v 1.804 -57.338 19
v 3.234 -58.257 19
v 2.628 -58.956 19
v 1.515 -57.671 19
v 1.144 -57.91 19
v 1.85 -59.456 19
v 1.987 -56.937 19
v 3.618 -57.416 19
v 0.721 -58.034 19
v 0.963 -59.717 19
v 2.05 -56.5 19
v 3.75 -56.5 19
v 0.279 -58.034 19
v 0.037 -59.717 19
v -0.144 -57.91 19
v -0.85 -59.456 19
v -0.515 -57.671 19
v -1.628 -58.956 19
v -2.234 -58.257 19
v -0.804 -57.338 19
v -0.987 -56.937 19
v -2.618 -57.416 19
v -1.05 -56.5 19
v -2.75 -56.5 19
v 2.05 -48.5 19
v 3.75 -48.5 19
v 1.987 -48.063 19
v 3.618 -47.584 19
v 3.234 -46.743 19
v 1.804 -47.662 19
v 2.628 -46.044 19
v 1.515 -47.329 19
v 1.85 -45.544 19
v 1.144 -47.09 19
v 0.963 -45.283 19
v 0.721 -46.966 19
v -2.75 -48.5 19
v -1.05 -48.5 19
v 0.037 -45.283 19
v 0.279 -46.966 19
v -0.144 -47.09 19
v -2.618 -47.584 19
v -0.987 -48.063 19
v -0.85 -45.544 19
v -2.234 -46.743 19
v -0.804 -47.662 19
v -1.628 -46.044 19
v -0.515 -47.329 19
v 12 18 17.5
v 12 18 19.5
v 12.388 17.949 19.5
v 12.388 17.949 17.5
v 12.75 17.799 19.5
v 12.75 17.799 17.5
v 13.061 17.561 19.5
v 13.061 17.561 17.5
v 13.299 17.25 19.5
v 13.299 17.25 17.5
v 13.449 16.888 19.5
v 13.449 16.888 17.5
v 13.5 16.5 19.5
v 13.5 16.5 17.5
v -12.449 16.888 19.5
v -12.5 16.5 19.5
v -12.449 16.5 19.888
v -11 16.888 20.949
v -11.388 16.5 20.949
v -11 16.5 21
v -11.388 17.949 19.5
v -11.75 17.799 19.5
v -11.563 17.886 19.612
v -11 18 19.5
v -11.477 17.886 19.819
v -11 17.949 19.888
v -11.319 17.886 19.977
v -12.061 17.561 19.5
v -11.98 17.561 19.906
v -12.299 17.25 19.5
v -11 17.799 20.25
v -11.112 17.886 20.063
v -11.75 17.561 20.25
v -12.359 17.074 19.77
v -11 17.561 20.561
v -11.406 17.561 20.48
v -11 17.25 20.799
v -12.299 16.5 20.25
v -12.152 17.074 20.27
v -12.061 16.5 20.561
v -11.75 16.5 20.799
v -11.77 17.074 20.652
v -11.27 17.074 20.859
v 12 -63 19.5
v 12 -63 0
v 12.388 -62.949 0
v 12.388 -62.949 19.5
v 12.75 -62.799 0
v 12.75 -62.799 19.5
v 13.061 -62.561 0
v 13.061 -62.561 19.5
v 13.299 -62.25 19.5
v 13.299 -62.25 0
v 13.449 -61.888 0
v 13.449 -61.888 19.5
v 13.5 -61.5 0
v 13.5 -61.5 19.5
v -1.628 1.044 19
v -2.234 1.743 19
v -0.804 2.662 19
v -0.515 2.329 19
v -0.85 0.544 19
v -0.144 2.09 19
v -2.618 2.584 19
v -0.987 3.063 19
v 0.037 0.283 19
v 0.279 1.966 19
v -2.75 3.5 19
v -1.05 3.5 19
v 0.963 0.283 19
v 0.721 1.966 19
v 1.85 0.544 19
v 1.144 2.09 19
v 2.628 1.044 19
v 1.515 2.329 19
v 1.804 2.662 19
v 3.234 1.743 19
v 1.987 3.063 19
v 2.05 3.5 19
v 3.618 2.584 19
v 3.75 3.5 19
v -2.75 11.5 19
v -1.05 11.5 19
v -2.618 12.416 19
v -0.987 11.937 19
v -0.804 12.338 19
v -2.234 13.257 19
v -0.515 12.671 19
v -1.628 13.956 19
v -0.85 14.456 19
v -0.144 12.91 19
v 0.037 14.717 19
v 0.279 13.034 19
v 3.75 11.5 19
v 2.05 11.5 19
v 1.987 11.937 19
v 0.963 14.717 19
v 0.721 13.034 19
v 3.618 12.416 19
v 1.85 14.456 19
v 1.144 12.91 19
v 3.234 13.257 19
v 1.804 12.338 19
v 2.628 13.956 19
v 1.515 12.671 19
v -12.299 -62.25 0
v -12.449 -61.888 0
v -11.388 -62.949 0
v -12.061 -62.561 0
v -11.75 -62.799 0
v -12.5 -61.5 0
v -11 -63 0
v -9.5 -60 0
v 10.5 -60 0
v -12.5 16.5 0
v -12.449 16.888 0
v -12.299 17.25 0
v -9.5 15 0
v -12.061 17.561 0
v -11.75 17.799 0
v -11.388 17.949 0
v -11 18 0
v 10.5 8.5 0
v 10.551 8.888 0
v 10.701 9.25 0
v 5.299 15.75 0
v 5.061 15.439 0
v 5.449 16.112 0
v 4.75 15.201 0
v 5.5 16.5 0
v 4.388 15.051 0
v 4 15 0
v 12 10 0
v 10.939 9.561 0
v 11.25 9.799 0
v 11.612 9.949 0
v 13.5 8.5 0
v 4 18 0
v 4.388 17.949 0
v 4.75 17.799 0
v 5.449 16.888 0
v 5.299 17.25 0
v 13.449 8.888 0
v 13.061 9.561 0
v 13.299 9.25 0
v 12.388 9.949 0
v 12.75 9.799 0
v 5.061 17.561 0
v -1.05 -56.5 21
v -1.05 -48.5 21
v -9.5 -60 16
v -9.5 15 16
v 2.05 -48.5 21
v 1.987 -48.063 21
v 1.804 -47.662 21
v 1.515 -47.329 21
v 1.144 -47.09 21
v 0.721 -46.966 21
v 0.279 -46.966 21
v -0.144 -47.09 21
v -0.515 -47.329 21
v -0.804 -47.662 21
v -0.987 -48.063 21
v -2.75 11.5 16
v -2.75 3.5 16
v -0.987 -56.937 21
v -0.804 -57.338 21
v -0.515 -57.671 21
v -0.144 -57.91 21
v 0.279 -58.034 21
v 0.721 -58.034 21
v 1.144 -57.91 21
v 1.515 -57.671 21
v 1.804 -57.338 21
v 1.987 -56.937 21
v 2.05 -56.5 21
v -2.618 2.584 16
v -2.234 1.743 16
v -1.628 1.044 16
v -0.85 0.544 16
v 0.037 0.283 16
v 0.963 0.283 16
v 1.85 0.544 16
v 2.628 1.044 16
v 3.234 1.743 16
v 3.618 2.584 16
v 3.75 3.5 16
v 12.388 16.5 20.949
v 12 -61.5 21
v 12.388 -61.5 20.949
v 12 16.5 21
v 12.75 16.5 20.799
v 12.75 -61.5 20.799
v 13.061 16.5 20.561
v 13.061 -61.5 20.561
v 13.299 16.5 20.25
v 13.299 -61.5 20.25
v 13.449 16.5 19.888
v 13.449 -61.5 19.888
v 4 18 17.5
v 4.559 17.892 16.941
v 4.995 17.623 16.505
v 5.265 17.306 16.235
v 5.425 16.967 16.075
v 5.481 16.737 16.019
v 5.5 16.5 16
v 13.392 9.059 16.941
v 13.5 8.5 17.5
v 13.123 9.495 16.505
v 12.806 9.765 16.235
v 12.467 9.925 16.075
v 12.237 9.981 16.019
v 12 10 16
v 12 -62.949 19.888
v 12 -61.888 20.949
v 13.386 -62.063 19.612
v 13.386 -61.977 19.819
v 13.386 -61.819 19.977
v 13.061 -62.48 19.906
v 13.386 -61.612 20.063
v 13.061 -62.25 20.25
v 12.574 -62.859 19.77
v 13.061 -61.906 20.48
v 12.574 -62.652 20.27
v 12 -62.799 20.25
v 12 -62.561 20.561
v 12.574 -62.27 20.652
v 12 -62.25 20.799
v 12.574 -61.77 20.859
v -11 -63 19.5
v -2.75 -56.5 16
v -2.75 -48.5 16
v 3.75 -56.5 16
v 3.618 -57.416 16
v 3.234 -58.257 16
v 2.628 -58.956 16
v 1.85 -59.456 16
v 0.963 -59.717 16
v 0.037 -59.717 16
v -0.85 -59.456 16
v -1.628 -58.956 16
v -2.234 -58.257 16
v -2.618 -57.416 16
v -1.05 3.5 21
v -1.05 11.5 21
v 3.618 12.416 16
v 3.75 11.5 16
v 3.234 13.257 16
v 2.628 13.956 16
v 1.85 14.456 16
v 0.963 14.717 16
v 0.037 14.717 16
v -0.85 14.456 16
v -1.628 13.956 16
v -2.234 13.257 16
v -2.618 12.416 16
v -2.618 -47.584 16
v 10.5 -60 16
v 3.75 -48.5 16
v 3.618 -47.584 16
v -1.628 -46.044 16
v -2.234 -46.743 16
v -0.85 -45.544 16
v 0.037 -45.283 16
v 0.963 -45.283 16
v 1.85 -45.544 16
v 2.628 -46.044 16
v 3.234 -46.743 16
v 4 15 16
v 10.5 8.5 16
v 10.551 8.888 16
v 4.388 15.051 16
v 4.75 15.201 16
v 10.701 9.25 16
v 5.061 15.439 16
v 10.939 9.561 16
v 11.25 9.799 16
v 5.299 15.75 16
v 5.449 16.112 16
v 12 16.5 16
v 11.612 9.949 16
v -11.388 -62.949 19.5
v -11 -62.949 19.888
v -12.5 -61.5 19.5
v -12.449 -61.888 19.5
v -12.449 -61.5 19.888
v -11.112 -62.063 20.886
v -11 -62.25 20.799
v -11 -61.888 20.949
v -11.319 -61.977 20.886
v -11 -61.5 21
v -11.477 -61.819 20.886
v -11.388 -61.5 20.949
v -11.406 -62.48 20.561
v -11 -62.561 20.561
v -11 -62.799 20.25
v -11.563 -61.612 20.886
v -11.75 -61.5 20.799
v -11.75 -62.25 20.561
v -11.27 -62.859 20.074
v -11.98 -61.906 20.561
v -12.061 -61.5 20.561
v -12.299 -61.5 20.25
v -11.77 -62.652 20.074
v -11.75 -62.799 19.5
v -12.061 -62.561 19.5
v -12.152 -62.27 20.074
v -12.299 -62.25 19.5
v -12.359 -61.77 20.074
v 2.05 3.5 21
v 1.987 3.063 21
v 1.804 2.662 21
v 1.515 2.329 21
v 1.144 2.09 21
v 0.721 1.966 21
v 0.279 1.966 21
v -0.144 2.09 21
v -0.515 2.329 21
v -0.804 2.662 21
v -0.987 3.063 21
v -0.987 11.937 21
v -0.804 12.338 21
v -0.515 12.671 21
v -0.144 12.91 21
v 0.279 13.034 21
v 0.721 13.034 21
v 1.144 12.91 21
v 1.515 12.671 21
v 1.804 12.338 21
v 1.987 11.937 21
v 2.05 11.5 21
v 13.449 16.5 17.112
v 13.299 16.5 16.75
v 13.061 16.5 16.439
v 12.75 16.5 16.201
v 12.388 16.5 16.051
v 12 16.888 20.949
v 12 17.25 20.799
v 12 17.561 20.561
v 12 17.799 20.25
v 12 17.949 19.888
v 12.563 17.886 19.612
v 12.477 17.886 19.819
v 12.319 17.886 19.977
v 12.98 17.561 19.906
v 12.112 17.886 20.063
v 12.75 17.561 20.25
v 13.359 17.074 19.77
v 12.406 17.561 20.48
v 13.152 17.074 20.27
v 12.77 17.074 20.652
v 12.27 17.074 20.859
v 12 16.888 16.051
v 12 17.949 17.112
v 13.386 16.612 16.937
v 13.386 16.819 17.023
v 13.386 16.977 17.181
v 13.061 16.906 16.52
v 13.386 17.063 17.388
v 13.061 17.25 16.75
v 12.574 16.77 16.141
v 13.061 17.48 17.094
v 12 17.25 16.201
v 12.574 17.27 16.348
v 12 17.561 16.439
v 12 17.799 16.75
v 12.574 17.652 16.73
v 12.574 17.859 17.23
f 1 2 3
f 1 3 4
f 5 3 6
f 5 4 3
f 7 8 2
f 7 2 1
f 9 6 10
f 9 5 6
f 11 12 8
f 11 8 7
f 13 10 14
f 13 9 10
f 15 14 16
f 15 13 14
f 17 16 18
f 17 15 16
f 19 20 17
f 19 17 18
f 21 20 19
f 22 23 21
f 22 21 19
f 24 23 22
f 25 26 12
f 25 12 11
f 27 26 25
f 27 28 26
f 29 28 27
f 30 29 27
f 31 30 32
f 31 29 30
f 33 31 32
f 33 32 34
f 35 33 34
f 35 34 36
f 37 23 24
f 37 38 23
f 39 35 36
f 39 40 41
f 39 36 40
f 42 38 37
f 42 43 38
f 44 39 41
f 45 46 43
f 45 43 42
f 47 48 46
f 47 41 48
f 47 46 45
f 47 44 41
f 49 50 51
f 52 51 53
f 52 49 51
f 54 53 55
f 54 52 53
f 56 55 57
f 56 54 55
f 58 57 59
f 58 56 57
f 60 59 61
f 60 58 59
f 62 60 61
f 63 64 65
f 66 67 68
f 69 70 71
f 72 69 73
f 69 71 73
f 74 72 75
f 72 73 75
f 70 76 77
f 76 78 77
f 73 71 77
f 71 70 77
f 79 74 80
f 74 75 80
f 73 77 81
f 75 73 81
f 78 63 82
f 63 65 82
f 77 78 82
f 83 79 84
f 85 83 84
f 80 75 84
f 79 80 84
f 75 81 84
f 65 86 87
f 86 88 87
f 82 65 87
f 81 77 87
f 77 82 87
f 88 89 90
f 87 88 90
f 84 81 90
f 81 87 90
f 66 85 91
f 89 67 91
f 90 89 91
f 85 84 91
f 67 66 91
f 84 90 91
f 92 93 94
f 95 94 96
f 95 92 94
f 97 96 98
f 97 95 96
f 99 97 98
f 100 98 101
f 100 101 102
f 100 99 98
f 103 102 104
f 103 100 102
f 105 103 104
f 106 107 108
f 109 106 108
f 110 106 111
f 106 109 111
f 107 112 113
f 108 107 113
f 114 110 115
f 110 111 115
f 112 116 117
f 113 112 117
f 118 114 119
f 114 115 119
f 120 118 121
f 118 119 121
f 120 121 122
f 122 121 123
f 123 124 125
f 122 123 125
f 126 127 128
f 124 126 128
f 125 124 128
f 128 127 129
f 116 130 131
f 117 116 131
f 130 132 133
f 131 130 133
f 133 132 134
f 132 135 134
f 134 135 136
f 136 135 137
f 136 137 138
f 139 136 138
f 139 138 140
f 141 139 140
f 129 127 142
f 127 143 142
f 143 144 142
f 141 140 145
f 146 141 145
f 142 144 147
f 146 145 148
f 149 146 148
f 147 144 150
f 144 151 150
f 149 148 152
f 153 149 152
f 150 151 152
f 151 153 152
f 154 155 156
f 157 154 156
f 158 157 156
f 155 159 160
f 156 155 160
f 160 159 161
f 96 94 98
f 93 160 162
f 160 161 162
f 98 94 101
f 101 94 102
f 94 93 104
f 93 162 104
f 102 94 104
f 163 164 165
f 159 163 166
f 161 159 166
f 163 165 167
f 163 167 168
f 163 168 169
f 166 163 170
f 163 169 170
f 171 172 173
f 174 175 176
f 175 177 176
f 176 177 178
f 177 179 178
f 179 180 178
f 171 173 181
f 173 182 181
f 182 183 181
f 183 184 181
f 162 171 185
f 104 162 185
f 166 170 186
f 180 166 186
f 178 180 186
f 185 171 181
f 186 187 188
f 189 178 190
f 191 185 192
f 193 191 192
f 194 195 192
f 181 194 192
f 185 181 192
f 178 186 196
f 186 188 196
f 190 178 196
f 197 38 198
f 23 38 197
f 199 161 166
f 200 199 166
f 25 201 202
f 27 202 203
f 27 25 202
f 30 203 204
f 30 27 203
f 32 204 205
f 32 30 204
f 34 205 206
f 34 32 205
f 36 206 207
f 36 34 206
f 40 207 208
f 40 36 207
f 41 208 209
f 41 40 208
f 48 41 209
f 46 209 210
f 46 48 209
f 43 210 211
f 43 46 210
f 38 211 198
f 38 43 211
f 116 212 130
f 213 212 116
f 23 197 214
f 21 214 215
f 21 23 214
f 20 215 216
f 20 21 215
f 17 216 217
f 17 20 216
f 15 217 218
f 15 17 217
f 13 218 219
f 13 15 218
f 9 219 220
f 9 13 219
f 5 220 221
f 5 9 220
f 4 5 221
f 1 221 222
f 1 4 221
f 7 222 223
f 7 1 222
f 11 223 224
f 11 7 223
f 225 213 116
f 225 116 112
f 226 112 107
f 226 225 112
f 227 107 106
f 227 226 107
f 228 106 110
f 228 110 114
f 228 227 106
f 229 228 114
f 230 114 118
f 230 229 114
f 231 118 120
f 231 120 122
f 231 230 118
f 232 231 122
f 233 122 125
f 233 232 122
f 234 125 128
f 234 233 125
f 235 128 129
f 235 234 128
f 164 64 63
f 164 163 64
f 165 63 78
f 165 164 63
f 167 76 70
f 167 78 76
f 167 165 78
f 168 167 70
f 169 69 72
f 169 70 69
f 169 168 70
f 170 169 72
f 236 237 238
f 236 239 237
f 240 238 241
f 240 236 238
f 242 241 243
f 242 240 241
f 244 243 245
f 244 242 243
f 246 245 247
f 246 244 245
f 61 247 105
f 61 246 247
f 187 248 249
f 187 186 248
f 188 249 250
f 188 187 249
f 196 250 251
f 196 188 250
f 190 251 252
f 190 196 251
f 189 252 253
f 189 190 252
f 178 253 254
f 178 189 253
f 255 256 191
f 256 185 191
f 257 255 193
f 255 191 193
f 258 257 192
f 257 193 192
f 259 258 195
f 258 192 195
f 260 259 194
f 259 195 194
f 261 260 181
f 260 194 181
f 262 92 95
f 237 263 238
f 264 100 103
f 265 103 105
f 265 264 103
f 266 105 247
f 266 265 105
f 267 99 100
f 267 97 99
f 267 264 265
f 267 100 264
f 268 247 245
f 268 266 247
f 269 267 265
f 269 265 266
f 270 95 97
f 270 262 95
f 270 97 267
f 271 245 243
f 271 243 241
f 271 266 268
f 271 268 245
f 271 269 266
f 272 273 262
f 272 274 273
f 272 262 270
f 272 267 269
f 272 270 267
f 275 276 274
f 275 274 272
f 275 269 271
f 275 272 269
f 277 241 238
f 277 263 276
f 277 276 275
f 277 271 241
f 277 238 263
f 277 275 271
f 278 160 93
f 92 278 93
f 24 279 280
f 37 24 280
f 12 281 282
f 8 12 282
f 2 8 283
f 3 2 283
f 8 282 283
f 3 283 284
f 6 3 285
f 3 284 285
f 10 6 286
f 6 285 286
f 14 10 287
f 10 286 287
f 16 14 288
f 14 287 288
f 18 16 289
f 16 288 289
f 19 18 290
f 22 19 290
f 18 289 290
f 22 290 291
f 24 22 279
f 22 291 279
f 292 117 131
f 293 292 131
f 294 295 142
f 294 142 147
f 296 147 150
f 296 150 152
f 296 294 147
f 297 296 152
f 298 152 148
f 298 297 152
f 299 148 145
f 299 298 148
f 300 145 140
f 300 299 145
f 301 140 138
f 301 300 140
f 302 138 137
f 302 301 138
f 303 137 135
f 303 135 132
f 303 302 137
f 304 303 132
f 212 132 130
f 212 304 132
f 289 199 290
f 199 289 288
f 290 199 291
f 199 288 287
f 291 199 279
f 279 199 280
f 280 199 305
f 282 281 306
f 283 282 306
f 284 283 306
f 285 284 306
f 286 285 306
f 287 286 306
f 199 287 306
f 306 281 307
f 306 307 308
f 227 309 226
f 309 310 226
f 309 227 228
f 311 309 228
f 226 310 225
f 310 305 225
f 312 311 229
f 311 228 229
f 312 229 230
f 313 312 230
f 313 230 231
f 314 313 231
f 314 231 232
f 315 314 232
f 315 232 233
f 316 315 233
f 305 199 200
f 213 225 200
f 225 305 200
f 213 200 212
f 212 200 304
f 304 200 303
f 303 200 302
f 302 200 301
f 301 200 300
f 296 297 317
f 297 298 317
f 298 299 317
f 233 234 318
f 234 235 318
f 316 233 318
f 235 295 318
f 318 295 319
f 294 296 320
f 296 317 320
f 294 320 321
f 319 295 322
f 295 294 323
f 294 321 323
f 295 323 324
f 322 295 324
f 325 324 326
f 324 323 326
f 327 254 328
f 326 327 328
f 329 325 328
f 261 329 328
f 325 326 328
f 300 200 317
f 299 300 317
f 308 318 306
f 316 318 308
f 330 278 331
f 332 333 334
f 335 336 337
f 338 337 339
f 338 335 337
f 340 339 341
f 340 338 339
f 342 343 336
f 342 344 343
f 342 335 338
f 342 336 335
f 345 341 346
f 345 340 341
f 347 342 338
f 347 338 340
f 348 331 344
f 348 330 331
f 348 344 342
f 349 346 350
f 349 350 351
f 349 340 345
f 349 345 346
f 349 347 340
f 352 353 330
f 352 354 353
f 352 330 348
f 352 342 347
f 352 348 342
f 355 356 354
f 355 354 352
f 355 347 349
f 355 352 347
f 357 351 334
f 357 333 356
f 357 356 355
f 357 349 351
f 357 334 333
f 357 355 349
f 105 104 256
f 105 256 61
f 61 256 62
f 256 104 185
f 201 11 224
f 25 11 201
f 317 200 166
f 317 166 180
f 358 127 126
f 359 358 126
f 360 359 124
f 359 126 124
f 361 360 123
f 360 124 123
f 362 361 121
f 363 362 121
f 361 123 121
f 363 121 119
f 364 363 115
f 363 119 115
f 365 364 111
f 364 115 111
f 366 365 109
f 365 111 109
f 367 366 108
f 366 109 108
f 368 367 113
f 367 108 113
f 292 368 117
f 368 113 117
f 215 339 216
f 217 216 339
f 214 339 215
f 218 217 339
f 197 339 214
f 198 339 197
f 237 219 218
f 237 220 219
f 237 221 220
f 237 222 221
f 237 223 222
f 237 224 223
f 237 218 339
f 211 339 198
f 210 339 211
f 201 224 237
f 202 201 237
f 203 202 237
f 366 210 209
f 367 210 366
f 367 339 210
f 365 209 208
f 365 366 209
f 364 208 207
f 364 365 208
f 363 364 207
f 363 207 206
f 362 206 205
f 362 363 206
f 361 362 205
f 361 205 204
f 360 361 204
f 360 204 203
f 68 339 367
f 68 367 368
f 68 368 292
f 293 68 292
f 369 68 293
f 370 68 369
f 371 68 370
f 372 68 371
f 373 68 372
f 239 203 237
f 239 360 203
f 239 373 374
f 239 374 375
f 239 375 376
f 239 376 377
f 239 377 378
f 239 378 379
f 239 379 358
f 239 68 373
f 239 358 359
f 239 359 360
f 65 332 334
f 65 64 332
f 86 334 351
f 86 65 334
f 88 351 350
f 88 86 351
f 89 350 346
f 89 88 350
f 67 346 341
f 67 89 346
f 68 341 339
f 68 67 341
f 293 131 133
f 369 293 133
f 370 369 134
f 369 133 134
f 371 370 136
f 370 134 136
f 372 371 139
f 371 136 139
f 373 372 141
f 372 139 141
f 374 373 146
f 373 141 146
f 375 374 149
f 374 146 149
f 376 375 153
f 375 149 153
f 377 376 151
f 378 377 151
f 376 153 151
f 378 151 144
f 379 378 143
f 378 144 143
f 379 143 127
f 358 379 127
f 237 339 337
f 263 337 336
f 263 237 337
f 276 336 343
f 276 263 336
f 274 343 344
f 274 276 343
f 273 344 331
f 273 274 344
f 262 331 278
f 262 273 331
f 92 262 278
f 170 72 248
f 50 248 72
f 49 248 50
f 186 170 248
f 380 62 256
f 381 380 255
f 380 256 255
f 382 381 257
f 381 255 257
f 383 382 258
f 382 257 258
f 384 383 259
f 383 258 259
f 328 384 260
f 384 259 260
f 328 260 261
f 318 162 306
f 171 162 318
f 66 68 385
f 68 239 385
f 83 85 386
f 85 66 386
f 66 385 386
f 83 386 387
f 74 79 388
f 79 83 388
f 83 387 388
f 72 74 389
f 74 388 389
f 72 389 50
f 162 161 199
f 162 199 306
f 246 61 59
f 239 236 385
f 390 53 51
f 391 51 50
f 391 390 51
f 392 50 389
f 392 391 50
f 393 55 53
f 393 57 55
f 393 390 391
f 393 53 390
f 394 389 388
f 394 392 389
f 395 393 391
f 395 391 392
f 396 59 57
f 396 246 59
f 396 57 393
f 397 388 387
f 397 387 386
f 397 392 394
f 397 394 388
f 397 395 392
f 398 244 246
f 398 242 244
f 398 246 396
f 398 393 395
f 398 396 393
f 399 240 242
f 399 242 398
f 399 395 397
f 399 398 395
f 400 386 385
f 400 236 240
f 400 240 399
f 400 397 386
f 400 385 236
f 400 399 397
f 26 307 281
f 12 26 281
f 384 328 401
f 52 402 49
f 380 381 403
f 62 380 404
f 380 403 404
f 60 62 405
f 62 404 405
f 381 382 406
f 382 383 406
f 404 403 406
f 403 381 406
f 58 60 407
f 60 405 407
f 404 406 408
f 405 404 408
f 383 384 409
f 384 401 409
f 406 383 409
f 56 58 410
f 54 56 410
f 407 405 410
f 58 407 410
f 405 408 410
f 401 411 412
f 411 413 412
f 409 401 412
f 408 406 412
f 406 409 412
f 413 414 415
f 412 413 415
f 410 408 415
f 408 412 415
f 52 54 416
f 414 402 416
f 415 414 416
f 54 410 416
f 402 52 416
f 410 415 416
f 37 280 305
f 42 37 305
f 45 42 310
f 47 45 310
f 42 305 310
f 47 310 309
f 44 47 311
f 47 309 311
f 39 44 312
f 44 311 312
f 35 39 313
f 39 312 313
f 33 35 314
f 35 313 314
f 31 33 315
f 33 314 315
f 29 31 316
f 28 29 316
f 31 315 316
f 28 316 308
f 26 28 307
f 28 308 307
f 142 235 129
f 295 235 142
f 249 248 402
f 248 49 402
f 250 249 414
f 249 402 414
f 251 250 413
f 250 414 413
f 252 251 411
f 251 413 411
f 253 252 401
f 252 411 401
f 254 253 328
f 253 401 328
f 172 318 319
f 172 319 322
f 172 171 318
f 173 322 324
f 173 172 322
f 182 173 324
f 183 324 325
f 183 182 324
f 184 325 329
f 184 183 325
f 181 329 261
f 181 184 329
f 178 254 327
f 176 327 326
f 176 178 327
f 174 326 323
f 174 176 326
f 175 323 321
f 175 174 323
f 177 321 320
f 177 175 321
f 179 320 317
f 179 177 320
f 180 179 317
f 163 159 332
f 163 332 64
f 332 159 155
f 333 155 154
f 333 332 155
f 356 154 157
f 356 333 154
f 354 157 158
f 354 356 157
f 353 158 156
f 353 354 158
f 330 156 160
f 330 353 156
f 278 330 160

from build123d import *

# Parameters (mm, degrees)
SKETCH1_W           = 26
SKETCH1_H           = 81
SKETCH1_W_2         = 20
SKETCH1_H_2         = 75
BOSS_EXTRUDE5_DEPTH = 16
SKETCH7_W           = 26
SKETCH7_H           = 81
BOSS_EXTRUDE6_DEPTH = 5
CUT_EXTRUDE3_DEPTH  = 3
SKETCH9_W           = 8
SKETCH9_H           = 16
CUT_EXTRUDE4_DEPTH  = 8
FILLET3_R           = 1.5


with BuildPart() as part:
    # Sketch1 → Boss-Extrude5 (new body)
    with BuildSketch(Plane.XY):
        with Locations((0.5, -22.5)):
            Rectangle(SKETCH1_W, SKETCH1_H)
        with Locations((0.5, -22.5)):
            Rectangle(SKETCH1_W_2, SKETCH1_H_2, mode=Mode.SUBTRACT)
    extrude(amount=BOSS_EXTRUDE5_DEPTH)

    # Sketch7 → Boss-Extrude6 (add)
    with BuildSketch(Plane.XY.offset(16)):
        with Locations((0.5, -22.5)):
            Rectangle(SKETCH7_W, SKETCH7_H)
        with BuildLine():
            Line((2.05, 11.5), (2.05, 3.5))
            ThreePointArc((2.05, 3.5), (0.5, 1.95), (-1.05, 3.5))
            Line((-1.05, 3.5), (-1.05, 11.5))
            ThreePointArc((-1.05, 11.5), (0.5, 13.05), (2.05, 11.5))
        make_face(mode=Mode.SUBTRACT)
        with BuildLine():
            Line((2.05, -56.5), (2.05, -48.5))
            ThreePointArc((2.05, -48.5), (0.5, -46.95), (-1.05, -48.5))
            Line((-1.05, -48.5), (-1.05, -56.5))
            ThreePointArc((-1.05, -56.5), (0.5, -58.05), (2.05, -56.5))
        make_face(mode=Mode.SUBTRACT)
    extrude(amount=BOSS_EXTRUDE6_DEPTH)

    # Sketch8 → Cut-Extrude3 (cut)
    with BuildSketch(Plane(origin=(0, 0, 16), x_dir=(-1, 0, 0), z_dir=(0, 0, -1))):
        with BuildLine():
            Line((2.75, 11.5), (2.75, 3.5))
            ThreePointArc((2.75, 3.5), (-0.5, 0.25), (-3.75, 3.5))
            Line((-3.75, 3.5), (-3.75, 11.5))
            ThreePointArc((-3.75, 11.5), (-0.5, 14.75), (2.75, 11.5))
        make_face()
        with BuildLine():
            Line((2.75, -56.5), (2.75, -48.5))
            ThreePointArc((2.75, -48.5), (-0.5, -45.25), (-3.75, -48.5))
            Line((-3.75, -48.5), (-3.75, -56.5))
            ThreePointArc((-3.75, -56.5), (-0.5, -59.75), (2.75, -56.5))
        make_face()
    extrude(amount=-CUT_EXTRUDE3_DEPTH, mode=Mode.SUBTRACT)

    # Sketch9 → Cut-Extrude4 (cut)
    with BuildSketch(Plane(origin=(0, 18, 0), x_dir=(1, 0, 0), z_dir=(0, 1, 0))):
        with Locations((9.5, -8)):
            Rectangle(SKETCH9_W, SKETCH9_H)
    extrude(amount=-CUT_EXTRUDE4_DEPTH, mode=Mode.SUBTRACT)

    # Fillet3
    fillet3_edges = [part.edges().sort_by_distance(p)[0] for p in [
        (-12.5, -63, 10.5),
        (0.5, -63, 21),
        (13.5, -63, 10.5),
        (13.5, -22.5, 21),
        (9.5, 18, 16),
        (13.5, 14, 16),
        (-12.5, -22.5, 21),
        (10.5, 10, 8),
        (5.5, 15, 8),
        (5.5, 18, 8),
        (13.5, 10, 8),
        (13.5, 18, 18.5),
        (-12.5, 18, 10.5),
        (0.5, 18, 21),
    ]]
    fillet(fillet3_edges, radius=FILLET3_R - 0.0001)  # a hair under: the kernel refuses the full size


solid = part.part
